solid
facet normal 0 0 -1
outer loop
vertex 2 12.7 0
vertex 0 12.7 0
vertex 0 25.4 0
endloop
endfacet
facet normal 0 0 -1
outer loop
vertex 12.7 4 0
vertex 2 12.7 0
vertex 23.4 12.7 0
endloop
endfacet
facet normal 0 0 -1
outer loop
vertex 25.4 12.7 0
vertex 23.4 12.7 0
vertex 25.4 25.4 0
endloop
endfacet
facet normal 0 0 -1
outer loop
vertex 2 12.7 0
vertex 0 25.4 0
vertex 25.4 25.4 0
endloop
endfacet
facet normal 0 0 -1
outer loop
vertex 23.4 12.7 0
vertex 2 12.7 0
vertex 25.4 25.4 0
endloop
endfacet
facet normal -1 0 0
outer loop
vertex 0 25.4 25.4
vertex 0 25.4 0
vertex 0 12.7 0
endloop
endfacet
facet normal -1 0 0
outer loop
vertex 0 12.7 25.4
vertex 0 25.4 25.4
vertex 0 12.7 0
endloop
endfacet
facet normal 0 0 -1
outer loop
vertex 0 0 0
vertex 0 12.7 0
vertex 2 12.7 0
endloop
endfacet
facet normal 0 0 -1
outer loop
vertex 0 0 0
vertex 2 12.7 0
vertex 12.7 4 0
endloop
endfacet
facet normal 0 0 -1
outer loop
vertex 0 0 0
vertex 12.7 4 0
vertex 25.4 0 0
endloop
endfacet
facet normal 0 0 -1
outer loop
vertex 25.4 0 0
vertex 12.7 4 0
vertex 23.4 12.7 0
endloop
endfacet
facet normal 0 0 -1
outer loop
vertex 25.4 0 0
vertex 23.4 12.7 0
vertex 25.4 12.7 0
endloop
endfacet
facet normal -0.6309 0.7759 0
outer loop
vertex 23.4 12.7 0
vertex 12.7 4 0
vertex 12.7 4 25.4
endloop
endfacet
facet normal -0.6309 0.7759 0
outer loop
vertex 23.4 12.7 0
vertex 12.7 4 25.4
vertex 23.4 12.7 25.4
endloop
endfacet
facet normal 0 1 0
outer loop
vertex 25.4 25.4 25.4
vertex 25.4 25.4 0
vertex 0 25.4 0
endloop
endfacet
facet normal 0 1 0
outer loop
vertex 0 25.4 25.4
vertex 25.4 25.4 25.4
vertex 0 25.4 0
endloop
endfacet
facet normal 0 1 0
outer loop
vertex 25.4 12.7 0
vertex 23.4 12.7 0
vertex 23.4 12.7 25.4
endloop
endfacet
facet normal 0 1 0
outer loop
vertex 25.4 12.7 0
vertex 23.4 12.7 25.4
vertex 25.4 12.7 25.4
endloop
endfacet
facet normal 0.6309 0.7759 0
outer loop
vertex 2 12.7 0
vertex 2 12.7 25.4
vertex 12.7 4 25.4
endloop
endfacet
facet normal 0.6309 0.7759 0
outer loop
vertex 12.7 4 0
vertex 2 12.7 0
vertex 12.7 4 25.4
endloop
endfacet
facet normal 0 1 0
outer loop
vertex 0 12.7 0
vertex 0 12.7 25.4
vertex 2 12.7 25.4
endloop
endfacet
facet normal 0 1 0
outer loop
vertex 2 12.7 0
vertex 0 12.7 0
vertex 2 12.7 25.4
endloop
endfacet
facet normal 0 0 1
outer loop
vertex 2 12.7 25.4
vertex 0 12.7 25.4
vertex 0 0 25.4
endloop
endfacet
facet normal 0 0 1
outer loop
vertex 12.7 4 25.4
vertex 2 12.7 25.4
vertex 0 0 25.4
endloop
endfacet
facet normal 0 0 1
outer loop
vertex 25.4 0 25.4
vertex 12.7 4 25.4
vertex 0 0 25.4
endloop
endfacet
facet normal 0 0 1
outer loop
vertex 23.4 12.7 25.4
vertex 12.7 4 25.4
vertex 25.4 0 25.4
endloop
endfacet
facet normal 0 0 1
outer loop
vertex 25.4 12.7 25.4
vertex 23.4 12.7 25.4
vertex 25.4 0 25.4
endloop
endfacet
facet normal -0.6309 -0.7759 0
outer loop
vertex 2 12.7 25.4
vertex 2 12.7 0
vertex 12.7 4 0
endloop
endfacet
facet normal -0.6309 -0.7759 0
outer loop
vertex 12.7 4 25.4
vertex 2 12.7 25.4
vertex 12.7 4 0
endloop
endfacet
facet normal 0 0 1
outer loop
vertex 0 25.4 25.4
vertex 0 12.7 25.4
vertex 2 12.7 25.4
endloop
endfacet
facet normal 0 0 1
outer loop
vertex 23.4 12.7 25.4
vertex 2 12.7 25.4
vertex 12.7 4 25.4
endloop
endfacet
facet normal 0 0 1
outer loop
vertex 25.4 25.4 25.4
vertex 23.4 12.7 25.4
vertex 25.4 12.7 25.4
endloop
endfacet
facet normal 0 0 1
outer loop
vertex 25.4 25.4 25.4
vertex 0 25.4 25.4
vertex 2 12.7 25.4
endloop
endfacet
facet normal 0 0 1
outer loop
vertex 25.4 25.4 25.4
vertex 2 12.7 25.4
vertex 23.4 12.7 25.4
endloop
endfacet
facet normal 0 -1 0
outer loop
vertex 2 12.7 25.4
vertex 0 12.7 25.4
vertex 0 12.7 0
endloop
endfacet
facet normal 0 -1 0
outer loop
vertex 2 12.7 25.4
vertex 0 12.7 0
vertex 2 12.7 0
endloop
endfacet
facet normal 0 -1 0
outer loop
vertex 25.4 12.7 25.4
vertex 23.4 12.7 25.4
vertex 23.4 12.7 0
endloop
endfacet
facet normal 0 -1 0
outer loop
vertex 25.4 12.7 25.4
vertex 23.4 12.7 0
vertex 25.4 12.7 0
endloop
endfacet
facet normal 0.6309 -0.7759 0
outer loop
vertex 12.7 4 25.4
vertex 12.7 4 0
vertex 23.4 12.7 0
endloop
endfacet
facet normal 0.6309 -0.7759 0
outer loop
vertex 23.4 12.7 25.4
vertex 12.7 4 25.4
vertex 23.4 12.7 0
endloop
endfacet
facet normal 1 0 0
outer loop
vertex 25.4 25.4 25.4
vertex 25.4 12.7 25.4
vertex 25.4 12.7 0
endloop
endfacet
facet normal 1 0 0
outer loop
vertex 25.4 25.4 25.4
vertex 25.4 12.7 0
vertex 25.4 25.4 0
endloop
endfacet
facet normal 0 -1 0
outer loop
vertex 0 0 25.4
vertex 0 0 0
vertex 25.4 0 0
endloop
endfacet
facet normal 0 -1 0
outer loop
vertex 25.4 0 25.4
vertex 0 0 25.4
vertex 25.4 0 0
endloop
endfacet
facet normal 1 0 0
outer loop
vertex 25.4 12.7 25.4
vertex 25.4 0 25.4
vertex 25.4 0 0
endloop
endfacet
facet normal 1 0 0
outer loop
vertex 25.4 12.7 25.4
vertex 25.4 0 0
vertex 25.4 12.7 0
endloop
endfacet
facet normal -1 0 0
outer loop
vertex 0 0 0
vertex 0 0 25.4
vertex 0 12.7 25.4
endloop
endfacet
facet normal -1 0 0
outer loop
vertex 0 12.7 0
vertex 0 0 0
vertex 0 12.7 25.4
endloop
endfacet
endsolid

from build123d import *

# Parameters (mm, degrees)
F0_W     = 25.4
F0_H     = 12.7
F1_DEPTH = 25.4
F3_DEPTH = 25.401
F5_DEPTH = 25.4


with BuildPart() as f1:
    # F0 (on Top) → F1 (new body)
    with BuildSketch(Plane.XY):
        with Locations((12.7, 6.35)):
            Rectangle(F0_W, F0_H)
    extrude(amount=F1_DEPTH)

    # F2 (on face) → F3 (cut, through all)
    with BuildSketch(Plane.XY.offset(25.4)):
        Polygon((23.4, 12.7), (2, 12.7), (12.7, 4), align=None)
    extrude(amount=-F3_DEPTH, mode=Mode.SUBTRACT)


with BuildPart() as f5:
    # F4 (on Top) → F5 (new body)
    with BuildSketch(Plane.XY):
        Polygon((12.7, 4), (23.4, 12.7), (25.4, 12.7), (25.4, 25.4), (0, 25.4), (0, 12.7), (2, 12.7), align=None)
    extrude(amount=F5_DEPTH)


solid = Compound([f1.part, f5.part])
